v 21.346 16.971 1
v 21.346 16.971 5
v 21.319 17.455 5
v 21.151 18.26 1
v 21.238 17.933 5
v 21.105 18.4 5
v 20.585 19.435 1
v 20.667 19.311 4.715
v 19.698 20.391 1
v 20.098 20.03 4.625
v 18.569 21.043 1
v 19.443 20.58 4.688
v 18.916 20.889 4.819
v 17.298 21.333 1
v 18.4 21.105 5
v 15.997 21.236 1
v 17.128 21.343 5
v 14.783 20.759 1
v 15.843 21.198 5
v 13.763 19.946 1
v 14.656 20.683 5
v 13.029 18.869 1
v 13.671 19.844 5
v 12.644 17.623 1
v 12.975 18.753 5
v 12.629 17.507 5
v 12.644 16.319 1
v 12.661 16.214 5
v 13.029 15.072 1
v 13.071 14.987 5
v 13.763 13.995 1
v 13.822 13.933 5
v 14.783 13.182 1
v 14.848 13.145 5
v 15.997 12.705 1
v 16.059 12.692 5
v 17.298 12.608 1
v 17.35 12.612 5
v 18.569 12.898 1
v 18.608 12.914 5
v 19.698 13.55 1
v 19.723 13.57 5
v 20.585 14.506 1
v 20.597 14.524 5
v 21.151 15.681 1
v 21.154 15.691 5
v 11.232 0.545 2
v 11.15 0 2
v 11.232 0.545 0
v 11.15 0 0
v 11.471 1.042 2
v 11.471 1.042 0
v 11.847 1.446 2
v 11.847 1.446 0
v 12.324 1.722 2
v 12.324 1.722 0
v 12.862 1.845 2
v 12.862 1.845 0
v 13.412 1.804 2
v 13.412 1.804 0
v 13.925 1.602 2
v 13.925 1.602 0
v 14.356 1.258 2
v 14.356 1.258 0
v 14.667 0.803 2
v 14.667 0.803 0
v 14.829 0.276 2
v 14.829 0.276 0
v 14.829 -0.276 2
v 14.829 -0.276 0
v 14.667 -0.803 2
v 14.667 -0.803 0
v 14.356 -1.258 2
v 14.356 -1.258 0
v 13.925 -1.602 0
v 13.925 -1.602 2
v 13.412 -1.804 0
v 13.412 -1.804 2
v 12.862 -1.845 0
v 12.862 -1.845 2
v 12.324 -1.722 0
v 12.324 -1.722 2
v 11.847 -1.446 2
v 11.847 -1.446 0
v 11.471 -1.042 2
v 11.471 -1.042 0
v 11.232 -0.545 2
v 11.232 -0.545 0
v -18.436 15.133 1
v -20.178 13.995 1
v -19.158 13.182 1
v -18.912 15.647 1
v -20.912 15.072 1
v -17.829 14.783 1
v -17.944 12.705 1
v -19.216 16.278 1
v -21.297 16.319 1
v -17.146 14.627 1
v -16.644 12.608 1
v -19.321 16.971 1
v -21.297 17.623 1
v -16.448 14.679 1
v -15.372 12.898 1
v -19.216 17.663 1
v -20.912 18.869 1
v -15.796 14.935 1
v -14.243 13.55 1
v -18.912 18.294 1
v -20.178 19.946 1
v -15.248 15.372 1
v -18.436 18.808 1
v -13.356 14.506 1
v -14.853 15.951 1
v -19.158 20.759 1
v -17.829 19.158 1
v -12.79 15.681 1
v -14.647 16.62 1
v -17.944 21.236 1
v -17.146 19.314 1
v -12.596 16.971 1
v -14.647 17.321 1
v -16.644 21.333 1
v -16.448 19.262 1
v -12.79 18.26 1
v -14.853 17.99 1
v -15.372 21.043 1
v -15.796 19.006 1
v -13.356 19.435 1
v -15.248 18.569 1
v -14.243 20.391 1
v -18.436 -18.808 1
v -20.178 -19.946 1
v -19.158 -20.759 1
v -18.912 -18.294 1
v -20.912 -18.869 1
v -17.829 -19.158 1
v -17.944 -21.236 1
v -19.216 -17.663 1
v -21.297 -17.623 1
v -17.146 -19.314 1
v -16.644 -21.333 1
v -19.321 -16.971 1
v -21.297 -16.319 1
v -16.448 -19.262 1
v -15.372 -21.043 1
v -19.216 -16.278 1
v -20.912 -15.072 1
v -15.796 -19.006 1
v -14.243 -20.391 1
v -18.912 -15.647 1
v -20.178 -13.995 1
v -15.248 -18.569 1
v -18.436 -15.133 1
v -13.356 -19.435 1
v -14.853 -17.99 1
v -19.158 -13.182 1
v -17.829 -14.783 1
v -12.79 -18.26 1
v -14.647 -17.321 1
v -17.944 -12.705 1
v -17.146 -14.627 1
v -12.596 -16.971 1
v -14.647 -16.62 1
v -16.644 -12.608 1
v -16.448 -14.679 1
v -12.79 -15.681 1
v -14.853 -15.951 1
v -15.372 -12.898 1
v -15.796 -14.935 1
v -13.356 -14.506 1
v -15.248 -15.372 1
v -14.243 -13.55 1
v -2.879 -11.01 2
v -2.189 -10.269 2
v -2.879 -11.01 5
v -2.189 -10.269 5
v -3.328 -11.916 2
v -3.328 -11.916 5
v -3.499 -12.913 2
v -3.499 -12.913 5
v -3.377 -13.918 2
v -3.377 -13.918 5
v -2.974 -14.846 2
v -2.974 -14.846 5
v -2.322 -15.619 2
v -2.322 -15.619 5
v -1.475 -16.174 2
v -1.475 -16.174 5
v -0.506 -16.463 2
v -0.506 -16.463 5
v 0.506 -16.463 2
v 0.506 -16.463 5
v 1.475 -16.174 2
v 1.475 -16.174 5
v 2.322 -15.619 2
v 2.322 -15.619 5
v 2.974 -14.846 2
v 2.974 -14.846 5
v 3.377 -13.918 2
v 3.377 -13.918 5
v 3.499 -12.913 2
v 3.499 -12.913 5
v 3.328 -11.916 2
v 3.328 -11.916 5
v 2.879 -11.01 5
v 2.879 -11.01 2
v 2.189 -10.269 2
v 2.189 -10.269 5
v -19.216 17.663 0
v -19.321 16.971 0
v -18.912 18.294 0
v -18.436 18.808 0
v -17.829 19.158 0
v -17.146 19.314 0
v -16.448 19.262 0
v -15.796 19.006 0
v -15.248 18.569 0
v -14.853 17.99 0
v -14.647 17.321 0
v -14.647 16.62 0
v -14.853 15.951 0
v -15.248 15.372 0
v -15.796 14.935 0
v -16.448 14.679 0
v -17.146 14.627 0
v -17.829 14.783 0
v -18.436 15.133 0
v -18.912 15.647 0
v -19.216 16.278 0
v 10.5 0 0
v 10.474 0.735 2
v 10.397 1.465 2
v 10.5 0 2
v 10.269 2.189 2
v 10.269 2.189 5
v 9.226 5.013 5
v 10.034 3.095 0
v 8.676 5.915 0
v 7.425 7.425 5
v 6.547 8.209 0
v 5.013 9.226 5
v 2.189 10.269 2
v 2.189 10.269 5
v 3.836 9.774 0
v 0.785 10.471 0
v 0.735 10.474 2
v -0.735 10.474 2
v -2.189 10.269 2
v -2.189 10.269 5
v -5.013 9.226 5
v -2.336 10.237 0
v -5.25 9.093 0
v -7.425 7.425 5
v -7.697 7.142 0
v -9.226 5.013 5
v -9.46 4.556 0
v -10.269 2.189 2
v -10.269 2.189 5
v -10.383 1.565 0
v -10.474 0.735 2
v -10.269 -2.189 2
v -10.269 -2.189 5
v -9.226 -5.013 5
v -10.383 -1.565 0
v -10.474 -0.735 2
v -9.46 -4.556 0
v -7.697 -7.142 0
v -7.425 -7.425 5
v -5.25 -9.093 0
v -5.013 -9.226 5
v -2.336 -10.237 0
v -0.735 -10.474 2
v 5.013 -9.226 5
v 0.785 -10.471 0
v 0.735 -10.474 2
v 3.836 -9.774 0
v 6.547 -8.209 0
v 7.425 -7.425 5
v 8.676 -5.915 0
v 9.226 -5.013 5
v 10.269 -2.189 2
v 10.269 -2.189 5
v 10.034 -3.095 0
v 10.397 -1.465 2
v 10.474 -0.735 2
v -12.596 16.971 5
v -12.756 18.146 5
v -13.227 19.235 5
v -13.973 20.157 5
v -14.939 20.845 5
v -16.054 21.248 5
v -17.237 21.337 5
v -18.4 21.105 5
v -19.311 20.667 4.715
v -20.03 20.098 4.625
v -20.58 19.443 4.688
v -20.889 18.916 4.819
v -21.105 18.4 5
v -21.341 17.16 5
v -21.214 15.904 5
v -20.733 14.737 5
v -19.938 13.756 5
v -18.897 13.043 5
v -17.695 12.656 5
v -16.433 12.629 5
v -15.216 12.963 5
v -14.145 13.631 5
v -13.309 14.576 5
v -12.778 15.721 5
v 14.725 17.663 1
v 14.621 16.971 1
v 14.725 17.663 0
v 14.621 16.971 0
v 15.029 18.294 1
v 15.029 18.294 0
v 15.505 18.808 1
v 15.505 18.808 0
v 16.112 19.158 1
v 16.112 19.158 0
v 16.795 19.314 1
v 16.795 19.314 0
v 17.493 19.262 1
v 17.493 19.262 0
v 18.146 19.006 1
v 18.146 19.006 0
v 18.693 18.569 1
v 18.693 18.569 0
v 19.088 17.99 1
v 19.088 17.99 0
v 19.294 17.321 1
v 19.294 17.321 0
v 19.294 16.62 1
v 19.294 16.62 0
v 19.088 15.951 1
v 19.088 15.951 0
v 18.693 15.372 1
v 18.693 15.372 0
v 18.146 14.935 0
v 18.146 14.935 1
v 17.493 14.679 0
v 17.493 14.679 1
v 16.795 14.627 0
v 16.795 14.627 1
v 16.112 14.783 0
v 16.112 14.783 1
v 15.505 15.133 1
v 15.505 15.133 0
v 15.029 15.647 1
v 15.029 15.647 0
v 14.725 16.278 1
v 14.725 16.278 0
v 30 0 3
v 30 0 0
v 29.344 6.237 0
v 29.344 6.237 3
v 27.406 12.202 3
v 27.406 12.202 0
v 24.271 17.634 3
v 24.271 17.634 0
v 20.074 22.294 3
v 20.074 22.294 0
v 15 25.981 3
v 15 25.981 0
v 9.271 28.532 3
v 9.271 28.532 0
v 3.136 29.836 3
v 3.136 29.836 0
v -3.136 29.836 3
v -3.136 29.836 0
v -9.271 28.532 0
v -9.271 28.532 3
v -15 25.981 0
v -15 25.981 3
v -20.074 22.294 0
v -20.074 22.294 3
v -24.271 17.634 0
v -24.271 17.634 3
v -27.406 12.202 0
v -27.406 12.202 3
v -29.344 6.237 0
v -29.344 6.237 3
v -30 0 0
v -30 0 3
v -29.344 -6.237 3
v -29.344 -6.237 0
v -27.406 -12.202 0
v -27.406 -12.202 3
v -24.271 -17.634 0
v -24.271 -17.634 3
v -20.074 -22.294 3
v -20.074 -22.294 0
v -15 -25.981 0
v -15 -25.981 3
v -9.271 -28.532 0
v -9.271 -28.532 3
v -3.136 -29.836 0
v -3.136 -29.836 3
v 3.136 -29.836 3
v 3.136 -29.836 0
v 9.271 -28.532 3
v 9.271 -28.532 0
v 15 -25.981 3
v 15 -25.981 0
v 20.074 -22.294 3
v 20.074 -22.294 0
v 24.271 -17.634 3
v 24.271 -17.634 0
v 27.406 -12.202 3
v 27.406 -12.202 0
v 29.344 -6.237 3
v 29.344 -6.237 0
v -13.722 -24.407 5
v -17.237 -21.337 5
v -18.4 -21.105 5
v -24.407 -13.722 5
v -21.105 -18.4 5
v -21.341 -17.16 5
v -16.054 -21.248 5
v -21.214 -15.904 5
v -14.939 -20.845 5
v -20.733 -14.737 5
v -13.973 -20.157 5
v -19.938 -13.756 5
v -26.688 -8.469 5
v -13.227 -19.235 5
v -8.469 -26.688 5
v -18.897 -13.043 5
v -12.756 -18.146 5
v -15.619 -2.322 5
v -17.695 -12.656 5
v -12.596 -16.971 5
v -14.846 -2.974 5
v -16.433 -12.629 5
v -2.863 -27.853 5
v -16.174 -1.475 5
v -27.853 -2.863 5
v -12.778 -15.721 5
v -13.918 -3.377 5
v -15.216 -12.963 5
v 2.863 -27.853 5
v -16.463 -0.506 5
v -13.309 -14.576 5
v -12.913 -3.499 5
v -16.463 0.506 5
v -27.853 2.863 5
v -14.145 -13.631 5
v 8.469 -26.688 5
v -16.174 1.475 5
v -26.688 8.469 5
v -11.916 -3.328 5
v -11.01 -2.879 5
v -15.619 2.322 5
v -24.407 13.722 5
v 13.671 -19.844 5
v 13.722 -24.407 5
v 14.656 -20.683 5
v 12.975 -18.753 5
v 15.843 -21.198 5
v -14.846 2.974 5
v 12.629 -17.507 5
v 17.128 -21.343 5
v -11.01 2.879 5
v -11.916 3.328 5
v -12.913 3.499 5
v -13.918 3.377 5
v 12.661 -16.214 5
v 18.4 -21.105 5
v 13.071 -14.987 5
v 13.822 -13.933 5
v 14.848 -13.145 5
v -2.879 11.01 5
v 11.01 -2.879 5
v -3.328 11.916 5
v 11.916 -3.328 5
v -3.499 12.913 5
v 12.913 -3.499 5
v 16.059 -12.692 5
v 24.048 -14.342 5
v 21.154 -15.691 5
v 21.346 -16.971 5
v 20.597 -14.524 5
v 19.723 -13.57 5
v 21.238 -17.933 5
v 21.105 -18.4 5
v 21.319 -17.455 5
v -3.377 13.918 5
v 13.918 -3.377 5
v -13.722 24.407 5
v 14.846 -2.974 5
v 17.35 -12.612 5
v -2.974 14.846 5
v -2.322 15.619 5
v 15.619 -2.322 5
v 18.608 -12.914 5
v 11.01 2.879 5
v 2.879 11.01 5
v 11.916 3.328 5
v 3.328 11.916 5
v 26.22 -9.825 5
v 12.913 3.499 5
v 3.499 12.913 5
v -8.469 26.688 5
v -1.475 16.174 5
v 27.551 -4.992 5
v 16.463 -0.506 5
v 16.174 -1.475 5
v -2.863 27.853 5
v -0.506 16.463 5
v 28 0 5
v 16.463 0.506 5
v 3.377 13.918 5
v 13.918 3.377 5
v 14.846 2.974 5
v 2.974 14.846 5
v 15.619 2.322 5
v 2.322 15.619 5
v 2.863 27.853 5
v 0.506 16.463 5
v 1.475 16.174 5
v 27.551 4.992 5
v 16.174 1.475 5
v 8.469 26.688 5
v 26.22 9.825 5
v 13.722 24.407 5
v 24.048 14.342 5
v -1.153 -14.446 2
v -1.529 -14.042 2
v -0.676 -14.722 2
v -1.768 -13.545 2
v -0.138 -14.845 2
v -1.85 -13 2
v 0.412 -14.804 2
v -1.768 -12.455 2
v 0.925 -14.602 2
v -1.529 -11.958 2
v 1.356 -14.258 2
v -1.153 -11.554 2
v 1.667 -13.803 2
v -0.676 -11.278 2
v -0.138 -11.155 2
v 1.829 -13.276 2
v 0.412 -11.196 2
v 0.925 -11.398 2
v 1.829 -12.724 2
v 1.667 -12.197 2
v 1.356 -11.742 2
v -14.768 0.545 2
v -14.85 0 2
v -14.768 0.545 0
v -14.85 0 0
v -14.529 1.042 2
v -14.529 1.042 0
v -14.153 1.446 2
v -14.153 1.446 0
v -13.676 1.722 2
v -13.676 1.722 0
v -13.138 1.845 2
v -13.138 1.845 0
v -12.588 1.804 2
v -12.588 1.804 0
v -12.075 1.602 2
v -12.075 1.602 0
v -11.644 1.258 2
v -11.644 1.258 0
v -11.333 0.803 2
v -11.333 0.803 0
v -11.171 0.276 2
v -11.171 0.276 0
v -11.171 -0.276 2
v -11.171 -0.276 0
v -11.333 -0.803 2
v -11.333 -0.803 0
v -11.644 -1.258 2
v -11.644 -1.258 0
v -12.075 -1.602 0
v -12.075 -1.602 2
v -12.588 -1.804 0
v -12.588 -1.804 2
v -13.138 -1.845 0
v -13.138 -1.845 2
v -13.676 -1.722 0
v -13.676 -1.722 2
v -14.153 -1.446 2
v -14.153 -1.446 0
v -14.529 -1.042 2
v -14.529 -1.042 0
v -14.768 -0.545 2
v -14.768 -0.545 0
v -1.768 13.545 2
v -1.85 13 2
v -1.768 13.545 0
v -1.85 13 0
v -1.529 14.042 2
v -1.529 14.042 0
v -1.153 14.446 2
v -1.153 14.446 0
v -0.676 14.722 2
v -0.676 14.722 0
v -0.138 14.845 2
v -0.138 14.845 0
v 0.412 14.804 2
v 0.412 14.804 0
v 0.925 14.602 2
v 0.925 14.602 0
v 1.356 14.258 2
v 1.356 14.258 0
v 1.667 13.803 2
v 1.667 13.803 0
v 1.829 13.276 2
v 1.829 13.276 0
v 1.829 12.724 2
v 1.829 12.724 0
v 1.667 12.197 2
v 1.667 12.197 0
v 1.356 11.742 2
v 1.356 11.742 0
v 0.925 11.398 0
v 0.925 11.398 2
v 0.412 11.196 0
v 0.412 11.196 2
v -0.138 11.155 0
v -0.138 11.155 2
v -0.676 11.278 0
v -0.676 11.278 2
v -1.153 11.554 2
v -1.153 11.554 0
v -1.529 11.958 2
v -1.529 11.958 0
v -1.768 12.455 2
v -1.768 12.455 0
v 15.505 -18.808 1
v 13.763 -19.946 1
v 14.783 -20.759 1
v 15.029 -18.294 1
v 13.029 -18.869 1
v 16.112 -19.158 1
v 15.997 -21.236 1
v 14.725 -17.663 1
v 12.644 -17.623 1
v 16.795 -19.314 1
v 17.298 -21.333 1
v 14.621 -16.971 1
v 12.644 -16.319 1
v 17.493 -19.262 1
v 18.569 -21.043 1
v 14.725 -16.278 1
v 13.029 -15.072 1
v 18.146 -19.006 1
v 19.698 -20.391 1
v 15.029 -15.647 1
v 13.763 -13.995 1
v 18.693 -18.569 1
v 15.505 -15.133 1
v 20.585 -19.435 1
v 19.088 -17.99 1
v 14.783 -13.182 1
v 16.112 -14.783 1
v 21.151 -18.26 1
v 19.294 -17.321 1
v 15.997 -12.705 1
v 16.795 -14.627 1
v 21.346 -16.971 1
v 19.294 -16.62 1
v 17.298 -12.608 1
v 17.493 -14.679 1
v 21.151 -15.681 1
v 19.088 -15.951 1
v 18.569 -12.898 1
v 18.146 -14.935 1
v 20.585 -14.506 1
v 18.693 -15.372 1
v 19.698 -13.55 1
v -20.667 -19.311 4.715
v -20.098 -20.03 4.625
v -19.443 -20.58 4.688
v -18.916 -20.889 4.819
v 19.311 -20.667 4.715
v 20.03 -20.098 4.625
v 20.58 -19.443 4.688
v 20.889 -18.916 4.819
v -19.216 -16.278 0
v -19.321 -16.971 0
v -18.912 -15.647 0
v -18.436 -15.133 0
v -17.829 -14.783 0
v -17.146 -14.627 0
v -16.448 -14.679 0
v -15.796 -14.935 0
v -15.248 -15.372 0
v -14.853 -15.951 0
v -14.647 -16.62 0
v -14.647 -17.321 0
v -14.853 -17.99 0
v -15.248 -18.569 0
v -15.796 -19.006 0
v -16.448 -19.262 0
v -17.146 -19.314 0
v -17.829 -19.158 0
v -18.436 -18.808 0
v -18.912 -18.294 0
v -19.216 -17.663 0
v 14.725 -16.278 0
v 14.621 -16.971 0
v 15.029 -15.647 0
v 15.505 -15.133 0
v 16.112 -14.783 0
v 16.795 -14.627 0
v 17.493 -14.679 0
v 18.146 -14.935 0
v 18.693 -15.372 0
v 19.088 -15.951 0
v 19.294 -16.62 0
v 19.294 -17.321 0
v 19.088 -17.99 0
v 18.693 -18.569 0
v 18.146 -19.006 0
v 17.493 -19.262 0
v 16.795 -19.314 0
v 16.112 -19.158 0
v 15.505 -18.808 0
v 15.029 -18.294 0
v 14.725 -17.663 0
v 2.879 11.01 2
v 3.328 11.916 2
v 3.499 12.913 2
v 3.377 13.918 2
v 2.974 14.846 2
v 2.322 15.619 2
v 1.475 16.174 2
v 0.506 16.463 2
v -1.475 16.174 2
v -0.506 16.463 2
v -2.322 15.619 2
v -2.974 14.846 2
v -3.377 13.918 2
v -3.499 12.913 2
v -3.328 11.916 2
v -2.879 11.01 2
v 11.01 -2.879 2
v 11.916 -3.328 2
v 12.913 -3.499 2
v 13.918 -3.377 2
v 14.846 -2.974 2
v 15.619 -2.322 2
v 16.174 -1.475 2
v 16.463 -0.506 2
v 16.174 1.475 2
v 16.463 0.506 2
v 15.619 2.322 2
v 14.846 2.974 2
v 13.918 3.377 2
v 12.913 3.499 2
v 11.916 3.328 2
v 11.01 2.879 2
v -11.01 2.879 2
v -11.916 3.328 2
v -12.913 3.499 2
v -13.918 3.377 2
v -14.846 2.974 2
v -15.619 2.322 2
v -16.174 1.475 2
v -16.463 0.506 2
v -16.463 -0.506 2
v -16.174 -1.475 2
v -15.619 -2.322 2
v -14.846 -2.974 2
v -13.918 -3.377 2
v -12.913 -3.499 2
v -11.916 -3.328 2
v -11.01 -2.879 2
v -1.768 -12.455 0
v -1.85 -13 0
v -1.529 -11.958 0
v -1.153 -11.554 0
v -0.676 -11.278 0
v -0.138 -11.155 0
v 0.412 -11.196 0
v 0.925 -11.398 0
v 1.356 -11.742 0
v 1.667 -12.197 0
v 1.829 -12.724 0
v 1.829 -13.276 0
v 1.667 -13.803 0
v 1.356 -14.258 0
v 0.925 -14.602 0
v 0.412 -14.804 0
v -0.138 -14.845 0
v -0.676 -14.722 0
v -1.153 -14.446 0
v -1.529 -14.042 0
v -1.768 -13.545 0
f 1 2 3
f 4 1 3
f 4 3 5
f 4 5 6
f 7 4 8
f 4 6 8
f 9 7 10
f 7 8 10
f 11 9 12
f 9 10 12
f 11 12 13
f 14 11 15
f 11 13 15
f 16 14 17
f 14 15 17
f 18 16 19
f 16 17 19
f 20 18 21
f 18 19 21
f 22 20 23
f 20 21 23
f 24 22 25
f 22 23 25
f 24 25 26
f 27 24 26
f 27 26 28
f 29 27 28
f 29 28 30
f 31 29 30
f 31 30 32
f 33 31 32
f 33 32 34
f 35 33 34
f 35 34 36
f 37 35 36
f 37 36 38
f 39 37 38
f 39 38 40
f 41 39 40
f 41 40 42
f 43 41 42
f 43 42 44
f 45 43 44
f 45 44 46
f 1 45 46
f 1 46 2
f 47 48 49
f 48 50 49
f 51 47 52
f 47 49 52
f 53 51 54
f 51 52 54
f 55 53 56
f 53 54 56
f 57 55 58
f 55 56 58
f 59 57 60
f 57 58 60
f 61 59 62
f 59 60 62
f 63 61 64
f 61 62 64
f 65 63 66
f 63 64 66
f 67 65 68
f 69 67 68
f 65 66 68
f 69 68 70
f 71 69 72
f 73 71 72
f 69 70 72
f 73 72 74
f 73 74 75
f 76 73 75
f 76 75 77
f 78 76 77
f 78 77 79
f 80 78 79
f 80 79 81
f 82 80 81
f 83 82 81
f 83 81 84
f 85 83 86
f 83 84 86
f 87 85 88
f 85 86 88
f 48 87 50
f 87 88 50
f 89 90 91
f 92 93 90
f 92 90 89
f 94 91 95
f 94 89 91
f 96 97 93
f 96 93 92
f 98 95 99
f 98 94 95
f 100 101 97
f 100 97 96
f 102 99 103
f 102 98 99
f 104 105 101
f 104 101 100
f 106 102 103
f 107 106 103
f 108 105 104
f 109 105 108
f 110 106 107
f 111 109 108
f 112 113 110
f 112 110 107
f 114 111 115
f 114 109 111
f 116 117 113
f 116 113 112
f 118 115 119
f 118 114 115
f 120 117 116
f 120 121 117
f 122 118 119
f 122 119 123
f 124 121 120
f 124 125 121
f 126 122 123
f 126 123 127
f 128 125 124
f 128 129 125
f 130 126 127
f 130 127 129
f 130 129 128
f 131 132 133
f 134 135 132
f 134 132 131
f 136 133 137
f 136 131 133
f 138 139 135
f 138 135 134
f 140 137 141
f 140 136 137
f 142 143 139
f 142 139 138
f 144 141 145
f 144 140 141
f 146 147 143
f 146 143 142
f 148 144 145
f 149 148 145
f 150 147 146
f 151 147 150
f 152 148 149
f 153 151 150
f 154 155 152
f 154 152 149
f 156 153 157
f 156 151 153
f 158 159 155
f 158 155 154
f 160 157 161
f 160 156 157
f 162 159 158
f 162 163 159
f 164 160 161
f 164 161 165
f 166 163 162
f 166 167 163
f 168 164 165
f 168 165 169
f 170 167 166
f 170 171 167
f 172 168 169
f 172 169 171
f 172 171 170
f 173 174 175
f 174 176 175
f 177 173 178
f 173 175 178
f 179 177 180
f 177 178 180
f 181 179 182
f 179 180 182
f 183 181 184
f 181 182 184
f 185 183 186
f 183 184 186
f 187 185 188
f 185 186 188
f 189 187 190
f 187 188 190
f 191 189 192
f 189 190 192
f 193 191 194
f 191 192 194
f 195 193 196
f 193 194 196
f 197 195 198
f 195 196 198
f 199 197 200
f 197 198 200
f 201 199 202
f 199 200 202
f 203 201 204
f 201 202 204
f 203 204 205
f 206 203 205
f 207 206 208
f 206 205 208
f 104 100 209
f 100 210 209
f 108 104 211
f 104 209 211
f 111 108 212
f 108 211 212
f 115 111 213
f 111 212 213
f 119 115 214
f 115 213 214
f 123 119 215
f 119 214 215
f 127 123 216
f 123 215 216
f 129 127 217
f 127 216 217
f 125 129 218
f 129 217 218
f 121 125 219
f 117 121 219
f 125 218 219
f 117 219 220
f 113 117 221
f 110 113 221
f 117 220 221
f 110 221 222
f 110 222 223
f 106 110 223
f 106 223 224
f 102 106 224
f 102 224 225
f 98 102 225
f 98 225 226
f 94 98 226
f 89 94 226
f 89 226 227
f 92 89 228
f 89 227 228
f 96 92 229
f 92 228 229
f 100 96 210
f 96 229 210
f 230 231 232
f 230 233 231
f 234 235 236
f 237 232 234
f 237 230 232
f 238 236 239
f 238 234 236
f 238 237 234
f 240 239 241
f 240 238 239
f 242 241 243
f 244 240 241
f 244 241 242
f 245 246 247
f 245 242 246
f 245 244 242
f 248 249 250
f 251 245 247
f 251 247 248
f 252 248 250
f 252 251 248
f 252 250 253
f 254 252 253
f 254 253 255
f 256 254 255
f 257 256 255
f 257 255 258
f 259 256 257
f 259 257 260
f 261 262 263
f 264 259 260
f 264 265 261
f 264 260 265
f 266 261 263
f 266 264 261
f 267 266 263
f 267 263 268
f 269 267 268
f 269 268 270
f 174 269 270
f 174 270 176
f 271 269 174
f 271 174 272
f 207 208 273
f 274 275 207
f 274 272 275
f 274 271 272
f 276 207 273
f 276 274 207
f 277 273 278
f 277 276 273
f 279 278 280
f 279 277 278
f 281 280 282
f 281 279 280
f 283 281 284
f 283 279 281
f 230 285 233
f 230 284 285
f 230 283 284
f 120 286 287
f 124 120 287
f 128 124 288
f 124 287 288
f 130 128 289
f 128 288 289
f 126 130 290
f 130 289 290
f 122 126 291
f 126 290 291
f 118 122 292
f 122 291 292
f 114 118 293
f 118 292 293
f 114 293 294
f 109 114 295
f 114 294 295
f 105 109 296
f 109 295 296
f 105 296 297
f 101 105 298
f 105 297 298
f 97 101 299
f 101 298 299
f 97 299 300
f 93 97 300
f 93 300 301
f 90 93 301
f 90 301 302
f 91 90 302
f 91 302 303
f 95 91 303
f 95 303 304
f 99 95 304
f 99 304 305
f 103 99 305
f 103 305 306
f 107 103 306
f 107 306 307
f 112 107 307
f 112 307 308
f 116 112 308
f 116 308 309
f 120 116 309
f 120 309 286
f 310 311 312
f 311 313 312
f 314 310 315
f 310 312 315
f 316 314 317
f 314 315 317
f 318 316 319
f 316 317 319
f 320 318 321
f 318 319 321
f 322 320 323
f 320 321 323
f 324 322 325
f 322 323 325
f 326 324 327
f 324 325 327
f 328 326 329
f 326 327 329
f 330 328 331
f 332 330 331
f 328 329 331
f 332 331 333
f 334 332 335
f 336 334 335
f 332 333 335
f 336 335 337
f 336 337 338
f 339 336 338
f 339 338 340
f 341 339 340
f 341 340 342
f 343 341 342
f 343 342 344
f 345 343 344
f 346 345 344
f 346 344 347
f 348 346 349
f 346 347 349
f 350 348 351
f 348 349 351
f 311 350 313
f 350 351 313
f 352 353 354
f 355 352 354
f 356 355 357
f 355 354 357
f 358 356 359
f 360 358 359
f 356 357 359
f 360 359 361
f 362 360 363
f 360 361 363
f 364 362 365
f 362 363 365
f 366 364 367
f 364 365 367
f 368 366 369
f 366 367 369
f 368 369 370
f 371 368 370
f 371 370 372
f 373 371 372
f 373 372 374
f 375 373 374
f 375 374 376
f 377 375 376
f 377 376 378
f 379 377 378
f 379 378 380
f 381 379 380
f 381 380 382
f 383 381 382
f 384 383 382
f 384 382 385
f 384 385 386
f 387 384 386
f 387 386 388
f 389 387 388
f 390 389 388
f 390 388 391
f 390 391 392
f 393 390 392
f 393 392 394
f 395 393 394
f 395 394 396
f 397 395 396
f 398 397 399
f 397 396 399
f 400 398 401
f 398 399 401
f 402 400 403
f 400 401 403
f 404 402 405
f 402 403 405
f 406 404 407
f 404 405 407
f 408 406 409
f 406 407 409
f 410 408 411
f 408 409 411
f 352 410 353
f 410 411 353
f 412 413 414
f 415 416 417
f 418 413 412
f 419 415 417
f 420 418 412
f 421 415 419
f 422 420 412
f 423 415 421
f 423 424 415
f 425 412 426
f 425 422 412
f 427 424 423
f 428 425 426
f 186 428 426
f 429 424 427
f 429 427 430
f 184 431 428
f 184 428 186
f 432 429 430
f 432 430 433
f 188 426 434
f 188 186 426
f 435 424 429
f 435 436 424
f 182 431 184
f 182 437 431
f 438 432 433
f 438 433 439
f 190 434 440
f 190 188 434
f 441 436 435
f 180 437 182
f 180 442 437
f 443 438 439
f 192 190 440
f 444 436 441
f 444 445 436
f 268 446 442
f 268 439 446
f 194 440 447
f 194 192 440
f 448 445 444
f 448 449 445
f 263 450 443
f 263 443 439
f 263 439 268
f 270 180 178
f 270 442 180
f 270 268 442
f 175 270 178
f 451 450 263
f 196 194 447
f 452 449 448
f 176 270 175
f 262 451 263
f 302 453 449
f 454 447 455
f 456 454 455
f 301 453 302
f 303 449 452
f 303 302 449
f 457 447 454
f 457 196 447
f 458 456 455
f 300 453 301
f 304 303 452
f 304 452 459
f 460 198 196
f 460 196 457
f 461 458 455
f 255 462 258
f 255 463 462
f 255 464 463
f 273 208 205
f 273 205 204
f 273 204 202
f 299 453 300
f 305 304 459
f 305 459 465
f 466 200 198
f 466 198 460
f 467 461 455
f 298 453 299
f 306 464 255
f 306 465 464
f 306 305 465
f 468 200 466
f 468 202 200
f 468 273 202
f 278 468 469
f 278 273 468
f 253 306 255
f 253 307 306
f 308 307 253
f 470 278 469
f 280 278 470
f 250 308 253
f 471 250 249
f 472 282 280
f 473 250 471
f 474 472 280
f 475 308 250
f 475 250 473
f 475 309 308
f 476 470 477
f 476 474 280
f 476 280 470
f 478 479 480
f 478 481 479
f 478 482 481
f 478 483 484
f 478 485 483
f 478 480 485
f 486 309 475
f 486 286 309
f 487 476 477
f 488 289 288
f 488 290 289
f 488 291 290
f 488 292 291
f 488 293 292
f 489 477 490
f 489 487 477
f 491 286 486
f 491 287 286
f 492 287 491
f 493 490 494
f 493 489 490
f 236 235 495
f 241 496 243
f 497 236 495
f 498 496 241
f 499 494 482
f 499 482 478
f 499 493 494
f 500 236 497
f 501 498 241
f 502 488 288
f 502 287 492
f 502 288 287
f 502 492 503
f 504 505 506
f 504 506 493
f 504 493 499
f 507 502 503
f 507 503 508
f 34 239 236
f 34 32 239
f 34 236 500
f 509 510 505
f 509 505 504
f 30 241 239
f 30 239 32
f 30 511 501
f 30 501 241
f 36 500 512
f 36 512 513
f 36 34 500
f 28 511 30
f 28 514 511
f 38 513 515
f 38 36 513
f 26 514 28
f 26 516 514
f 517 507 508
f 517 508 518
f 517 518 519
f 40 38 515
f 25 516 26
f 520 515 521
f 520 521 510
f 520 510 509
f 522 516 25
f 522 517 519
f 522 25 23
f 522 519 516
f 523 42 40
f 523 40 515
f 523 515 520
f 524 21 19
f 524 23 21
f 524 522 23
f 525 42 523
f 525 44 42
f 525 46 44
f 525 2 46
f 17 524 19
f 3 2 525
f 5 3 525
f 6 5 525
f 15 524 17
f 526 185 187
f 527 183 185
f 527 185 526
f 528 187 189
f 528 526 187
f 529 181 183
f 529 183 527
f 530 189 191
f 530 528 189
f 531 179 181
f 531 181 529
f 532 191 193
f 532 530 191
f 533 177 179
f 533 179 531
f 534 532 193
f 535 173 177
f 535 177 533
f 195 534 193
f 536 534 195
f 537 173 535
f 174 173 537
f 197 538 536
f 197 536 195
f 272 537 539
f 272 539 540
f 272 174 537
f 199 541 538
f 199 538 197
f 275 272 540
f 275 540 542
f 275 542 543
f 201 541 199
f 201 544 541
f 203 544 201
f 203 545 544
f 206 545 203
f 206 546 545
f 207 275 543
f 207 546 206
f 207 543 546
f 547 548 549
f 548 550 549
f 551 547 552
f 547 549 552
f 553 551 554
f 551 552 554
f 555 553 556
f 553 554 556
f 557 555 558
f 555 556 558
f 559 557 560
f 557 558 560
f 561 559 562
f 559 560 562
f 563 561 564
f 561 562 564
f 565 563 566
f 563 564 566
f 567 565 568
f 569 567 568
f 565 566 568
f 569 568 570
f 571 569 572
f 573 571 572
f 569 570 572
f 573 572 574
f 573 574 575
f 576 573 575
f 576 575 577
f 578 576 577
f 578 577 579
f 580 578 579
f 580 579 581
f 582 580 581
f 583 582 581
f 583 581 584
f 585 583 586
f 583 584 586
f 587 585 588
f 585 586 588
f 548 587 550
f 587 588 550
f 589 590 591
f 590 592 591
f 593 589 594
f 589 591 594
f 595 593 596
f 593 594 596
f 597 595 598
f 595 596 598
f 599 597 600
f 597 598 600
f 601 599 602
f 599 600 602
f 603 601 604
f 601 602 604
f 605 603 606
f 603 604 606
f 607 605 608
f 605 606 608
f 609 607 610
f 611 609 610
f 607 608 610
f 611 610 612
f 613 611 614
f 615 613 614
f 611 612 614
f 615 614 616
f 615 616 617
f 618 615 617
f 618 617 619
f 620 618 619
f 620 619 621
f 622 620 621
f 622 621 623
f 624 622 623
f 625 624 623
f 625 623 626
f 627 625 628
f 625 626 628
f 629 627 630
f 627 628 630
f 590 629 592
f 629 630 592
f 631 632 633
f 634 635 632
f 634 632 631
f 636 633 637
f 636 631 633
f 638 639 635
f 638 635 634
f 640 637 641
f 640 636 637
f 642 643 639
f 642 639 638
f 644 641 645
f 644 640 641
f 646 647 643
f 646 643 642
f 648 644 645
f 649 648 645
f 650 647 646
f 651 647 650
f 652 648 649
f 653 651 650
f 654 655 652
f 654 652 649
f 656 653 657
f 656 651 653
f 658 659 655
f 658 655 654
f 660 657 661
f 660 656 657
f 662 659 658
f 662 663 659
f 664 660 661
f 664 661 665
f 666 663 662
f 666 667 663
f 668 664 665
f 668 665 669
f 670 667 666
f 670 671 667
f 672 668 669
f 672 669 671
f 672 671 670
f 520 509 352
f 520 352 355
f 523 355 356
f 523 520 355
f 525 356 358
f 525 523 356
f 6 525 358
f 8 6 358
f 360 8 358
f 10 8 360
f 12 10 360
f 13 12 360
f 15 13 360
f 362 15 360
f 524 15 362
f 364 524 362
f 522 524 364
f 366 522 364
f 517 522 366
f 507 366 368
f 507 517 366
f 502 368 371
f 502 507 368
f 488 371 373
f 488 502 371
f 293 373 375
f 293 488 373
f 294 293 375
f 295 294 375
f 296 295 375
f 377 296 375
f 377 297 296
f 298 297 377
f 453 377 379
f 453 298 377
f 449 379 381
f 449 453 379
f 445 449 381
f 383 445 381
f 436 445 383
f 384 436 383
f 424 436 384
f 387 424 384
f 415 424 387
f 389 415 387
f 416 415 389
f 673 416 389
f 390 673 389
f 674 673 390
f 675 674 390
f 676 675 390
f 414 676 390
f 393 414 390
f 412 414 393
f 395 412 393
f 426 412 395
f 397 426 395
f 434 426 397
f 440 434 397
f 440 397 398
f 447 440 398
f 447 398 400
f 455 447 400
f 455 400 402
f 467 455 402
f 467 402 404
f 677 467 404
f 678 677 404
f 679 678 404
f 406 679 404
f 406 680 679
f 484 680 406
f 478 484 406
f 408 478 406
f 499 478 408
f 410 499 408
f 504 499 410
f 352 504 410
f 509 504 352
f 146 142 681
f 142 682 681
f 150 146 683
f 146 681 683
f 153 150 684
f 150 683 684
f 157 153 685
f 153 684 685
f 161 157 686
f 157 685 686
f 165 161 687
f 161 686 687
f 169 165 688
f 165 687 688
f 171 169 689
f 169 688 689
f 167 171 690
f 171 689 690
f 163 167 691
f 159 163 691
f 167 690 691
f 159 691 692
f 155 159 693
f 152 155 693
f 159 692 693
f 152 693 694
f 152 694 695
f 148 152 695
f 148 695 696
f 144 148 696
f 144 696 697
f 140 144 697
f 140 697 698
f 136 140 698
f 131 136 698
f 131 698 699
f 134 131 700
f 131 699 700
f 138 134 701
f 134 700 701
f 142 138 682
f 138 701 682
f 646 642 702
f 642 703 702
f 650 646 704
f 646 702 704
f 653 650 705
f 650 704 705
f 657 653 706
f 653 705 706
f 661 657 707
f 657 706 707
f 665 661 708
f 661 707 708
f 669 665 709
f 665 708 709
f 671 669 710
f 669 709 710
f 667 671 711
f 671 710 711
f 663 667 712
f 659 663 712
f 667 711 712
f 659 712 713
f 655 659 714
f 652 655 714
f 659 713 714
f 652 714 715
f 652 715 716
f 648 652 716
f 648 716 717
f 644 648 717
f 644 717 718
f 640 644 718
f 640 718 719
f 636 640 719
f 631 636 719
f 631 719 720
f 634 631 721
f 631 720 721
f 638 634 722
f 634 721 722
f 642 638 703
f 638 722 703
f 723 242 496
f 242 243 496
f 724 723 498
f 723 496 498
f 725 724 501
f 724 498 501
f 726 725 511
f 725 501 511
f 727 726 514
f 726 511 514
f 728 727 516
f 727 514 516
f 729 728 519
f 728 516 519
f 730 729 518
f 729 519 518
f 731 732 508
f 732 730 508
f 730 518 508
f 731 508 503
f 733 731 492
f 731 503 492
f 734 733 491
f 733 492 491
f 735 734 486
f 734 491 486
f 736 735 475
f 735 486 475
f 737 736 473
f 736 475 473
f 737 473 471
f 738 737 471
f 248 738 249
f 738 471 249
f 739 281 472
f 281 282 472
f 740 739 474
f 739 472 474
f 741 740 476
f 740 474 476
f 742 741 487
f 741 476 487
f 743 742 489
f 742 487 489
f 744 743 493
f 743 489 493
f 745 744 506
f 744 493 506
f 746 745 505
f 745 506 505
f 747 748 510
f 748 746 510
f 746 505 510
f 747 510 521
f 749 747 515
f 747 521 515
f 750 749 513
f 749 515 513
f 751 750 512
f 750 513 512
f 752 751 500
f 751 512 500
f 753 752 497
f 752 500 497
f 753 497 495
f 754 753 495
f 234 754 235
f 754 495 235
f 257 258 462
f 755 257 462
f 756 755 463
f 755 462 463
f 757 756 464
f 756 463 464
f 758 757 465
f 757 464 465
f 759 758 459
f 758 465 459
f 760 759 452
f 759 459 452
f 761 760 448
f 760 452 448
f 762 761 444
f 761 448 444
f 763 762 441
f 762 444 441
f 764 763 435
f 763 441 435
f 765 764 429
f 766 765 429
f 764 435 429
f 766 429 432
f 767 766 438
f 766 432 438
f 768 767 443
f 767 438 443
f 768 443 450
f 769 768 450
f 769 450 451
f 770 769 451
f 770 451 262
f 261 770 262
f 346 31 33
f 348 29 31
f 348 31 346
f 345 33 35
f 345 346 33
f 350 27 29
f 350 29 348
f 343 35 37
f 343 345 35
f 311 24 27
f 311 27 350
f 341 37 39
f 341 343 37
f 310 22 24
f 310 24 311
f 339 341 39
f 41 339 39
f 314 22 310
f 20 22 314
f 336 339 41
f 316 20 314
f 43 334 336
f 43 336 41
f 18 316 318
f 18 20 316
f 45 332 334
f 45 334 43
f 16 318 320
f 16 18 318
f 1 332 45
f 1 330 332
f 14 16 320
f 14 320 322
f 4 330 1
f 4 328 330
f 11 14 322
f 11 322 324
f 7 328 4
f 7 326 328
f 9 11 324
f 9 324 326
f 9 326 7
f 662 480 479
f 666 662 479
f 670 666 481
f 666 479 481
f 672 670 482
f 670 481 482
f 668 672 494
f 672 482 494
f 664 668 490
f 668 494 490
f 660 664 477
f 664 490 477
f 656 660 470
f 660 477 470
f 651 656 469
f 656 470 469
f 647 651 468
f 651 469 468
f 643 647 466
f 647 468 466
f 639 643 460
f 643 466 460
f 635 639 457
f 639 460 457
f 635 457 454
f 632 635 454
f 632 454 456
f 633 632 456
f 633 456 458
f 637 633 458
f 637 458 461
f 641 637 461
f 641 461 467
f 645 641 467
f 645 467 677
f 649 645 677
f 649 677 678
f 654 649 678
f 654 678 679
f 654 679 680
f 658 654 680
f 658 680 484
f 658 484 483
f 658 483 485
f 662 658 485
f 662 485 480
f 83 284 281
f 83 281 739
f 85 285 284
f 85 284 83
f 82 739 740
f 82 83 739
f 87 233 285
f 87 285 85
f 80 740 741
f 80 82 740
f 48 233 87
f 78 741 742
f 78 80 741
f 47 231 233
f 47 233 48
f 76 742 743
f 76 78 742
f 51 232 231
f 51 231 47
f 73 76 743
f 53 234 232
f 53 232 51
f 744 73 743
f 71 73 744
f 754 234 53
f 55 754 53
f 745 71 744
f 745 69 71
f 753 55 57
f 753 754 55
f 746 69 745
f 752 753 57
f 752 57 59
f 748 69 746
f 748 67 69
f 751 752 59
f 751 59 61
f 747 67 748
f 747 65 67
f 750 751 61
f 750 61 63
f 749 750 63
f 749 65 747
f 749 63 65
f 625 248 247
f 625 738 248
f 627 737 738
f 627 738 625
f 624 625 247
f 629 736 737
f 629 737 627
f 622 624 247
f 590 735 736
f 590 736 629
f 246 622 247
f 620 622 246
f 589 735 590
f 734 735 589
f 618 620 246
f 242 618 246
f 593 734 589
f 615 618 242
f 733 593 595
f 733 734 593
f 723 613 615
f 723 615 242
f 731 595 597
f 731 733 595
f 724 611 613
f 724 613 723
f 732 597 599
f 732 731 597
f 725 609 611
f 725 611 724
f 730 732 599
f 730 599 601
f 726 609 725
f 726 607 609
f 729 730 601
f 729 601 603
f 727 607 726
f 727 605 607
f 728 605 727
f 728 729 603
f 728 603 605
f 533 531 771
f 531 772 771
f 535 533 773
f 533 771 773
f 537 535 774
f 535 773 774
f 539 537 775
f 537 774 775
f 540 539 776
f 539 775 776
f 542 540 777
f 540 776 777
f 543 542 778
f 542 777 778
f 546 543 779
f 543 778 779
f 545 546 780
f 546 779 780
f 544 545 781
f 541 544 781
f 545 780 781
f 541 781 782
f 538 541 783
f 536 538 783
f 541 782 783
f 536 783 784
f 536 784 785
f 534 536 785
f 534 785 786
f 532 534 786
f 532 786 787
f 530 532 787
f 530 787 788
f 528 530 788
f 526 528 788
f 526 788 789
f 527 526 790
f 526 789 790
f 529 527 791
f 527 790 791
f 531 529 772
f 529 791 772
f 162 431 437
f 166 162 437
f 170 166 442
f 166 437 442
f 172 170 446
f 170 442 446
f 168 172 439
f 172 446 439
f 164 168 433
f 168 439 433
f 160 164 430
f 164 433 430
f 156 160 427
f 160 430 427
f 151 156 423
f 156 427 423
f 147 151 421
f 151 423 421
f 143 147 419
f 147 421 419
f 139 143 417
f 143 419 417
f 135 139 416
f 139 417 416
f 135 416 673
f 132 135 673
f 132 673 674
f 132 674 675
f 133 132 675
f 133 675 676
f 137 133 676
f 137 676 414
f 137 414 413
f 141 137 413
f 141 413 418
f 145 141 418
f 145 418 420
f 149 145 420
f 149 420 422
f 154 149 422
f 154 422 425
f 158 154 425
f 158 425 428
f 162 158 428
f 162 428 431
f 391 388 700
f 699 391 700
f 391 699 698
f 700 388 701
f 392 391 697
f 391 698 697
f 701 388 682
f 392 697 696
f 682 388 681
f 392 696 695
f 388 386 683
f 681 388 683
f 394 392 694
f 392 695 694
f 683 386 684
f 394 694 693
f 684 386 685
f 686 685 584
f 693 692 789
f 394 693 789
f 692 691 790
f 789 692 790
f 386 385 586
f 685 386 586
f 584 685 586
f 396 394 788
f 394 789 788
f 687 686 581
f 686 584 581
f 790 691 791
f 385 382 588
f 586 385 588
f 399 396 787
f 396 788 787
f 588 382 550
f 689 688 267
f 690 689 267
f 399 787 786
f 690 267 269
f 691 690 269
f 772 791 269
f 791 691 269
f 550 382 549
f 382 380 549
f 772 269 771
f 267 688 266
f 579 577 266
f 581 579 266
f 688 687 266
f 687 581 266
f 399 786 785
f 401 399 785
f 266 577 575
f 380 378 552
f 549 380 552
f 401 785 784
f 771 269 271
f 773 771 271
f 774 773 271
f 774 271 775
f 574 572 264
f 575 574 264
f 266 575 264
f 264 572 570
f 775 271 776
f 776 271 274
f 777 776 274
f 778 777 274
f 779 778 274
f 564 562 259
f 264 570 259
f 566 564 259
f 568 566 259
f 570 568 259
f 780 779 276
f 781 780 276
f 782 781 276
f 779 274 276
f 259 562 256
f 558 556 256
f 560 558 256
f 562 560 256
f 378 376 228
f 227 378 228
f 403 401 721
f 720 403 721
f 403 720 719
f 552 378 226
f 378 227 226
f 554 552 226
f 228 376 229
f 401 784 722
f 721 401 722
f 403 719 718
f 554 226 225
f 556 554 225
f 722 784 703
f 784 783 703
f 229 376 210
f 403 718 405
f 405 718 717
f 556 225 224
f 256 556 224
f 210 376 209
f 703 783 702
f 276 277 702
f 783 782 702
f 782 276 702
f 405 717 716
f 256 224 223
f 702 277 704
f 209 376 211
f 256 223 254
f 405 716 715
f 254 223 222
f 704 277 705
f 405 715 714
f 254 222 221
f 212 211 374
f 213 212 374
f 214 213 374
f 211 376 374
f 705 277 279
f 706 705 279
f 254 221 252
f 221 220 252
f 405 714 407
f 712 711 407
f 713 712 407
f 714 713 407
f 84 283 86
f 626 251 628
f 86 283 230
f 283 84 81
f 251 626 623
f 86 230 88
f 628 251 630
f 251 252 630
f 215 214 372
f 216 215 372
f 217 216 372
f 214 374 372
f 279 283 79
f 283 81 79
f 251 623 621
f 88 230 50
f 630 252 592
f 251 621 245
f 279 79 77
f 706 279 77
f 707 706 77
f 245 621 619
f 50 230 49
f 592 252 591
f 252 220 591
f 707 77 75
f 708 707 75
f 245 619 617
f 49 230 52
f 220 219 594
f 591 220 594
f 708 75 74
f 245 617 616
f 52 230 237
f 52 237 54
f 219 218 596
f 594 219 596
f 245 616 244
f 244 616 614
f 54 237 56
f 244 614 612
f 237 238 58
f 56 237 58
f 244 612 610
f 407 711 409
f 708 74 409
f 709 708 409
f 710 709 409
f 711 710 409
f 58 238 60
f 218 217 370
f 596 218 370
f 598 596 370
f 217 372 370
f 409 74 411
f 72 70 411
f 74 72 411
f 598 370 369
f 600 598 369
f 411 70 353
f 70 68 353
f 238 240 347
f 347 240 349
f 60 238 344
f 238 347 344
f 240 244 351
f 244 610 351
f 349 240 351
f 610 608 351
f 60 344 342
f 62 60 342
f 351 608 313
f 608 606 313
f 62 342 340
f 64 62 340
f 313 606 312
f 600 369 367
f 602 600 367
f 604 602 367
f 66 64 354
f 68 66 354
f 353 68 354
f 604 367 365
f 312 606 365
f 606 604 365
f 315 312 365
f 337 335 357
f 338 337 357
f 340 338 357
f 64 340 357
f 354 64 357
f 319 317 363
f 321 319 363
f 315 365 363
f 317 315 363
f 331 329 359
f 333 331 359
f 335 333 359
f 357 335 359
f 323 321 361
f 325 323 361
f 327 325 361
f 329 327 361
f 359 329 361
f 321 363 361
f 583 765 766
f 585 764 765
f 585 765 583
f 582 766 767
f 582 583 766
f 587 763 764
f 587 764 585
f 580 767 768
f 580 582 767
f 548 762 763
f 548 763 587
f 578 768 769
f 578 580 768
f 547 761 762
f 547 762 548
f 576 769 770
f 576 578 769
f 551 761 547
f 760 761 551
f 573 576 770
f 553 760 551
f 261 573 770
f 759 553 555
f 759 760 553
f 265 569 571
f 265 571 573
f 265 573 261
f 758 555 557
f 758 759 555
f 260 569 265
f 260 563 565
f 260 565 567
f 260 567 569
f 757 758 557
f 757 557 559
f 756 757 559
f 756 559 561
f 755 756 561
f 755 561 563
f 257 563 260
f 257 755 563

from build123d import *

# Parameters (mm, degrees)
F0_R           = 30
F0_R_2         = 10.5
F1_DEPTH       = 5
F3_D           = 4.7
F3_CBORE_D     = 8.75
F3_CBORE_DEPTH = 4
F5_D           = 3.7
F5_CBORE_D     = 7
F5_CBORE_DEPTH = 3


# Not quite as in the source:
# - a fillet or chamfer that OpenCascade refuses, or shapes differently, is made with other operations: its cross-section is extruded or revolved along the edge and cut away or added


with BuildPart() as f1:
    # F0 (on Top) → F1 (new body)
    with BuildSketch(Plane.XY):
        Circle(F0_R)
        Circle(F0_R_2, mode=Mode.SUBTRACT)
    extrude(amount=F1_DEPTH)

    # F3 (through all)
    with Locations(Plane.XY.offset(5)):
        with Locations((-16.9705627485, 16.9705627485), (16.9705627485, 16.9705627485), (16.9705627485, -16.9705627485), (-16.9705627485, -16.9705627485)):
            CounterBoreHole(F3_D / 2, F3_CBORE_D / 2, F3_CBORE_DEPTH)

    # F5 (through all)
    with Locations(Plane.XY.offset(5)):
        with Locations((0, 13), (-13, 0), (0, -13), (13, 0)):
            CounterBoreHole(F5_D / 2, F5_CBORE_D / 2, F5_CBORE_DEPTH)

    # F6: chamfer of 2 on 1 edges, made by hand

    # F6_s1 → F6_t2 (revolve, cut)
    with BuildSketch(Plane.XZ):
        Polygon((30, 3), (28, 5), (30, 5), align=None)
    revolve(axis=Axis((0, 0, 5), (0, 0, 1)), mode=Mode.SUBTRACT)


solid = f1.part
